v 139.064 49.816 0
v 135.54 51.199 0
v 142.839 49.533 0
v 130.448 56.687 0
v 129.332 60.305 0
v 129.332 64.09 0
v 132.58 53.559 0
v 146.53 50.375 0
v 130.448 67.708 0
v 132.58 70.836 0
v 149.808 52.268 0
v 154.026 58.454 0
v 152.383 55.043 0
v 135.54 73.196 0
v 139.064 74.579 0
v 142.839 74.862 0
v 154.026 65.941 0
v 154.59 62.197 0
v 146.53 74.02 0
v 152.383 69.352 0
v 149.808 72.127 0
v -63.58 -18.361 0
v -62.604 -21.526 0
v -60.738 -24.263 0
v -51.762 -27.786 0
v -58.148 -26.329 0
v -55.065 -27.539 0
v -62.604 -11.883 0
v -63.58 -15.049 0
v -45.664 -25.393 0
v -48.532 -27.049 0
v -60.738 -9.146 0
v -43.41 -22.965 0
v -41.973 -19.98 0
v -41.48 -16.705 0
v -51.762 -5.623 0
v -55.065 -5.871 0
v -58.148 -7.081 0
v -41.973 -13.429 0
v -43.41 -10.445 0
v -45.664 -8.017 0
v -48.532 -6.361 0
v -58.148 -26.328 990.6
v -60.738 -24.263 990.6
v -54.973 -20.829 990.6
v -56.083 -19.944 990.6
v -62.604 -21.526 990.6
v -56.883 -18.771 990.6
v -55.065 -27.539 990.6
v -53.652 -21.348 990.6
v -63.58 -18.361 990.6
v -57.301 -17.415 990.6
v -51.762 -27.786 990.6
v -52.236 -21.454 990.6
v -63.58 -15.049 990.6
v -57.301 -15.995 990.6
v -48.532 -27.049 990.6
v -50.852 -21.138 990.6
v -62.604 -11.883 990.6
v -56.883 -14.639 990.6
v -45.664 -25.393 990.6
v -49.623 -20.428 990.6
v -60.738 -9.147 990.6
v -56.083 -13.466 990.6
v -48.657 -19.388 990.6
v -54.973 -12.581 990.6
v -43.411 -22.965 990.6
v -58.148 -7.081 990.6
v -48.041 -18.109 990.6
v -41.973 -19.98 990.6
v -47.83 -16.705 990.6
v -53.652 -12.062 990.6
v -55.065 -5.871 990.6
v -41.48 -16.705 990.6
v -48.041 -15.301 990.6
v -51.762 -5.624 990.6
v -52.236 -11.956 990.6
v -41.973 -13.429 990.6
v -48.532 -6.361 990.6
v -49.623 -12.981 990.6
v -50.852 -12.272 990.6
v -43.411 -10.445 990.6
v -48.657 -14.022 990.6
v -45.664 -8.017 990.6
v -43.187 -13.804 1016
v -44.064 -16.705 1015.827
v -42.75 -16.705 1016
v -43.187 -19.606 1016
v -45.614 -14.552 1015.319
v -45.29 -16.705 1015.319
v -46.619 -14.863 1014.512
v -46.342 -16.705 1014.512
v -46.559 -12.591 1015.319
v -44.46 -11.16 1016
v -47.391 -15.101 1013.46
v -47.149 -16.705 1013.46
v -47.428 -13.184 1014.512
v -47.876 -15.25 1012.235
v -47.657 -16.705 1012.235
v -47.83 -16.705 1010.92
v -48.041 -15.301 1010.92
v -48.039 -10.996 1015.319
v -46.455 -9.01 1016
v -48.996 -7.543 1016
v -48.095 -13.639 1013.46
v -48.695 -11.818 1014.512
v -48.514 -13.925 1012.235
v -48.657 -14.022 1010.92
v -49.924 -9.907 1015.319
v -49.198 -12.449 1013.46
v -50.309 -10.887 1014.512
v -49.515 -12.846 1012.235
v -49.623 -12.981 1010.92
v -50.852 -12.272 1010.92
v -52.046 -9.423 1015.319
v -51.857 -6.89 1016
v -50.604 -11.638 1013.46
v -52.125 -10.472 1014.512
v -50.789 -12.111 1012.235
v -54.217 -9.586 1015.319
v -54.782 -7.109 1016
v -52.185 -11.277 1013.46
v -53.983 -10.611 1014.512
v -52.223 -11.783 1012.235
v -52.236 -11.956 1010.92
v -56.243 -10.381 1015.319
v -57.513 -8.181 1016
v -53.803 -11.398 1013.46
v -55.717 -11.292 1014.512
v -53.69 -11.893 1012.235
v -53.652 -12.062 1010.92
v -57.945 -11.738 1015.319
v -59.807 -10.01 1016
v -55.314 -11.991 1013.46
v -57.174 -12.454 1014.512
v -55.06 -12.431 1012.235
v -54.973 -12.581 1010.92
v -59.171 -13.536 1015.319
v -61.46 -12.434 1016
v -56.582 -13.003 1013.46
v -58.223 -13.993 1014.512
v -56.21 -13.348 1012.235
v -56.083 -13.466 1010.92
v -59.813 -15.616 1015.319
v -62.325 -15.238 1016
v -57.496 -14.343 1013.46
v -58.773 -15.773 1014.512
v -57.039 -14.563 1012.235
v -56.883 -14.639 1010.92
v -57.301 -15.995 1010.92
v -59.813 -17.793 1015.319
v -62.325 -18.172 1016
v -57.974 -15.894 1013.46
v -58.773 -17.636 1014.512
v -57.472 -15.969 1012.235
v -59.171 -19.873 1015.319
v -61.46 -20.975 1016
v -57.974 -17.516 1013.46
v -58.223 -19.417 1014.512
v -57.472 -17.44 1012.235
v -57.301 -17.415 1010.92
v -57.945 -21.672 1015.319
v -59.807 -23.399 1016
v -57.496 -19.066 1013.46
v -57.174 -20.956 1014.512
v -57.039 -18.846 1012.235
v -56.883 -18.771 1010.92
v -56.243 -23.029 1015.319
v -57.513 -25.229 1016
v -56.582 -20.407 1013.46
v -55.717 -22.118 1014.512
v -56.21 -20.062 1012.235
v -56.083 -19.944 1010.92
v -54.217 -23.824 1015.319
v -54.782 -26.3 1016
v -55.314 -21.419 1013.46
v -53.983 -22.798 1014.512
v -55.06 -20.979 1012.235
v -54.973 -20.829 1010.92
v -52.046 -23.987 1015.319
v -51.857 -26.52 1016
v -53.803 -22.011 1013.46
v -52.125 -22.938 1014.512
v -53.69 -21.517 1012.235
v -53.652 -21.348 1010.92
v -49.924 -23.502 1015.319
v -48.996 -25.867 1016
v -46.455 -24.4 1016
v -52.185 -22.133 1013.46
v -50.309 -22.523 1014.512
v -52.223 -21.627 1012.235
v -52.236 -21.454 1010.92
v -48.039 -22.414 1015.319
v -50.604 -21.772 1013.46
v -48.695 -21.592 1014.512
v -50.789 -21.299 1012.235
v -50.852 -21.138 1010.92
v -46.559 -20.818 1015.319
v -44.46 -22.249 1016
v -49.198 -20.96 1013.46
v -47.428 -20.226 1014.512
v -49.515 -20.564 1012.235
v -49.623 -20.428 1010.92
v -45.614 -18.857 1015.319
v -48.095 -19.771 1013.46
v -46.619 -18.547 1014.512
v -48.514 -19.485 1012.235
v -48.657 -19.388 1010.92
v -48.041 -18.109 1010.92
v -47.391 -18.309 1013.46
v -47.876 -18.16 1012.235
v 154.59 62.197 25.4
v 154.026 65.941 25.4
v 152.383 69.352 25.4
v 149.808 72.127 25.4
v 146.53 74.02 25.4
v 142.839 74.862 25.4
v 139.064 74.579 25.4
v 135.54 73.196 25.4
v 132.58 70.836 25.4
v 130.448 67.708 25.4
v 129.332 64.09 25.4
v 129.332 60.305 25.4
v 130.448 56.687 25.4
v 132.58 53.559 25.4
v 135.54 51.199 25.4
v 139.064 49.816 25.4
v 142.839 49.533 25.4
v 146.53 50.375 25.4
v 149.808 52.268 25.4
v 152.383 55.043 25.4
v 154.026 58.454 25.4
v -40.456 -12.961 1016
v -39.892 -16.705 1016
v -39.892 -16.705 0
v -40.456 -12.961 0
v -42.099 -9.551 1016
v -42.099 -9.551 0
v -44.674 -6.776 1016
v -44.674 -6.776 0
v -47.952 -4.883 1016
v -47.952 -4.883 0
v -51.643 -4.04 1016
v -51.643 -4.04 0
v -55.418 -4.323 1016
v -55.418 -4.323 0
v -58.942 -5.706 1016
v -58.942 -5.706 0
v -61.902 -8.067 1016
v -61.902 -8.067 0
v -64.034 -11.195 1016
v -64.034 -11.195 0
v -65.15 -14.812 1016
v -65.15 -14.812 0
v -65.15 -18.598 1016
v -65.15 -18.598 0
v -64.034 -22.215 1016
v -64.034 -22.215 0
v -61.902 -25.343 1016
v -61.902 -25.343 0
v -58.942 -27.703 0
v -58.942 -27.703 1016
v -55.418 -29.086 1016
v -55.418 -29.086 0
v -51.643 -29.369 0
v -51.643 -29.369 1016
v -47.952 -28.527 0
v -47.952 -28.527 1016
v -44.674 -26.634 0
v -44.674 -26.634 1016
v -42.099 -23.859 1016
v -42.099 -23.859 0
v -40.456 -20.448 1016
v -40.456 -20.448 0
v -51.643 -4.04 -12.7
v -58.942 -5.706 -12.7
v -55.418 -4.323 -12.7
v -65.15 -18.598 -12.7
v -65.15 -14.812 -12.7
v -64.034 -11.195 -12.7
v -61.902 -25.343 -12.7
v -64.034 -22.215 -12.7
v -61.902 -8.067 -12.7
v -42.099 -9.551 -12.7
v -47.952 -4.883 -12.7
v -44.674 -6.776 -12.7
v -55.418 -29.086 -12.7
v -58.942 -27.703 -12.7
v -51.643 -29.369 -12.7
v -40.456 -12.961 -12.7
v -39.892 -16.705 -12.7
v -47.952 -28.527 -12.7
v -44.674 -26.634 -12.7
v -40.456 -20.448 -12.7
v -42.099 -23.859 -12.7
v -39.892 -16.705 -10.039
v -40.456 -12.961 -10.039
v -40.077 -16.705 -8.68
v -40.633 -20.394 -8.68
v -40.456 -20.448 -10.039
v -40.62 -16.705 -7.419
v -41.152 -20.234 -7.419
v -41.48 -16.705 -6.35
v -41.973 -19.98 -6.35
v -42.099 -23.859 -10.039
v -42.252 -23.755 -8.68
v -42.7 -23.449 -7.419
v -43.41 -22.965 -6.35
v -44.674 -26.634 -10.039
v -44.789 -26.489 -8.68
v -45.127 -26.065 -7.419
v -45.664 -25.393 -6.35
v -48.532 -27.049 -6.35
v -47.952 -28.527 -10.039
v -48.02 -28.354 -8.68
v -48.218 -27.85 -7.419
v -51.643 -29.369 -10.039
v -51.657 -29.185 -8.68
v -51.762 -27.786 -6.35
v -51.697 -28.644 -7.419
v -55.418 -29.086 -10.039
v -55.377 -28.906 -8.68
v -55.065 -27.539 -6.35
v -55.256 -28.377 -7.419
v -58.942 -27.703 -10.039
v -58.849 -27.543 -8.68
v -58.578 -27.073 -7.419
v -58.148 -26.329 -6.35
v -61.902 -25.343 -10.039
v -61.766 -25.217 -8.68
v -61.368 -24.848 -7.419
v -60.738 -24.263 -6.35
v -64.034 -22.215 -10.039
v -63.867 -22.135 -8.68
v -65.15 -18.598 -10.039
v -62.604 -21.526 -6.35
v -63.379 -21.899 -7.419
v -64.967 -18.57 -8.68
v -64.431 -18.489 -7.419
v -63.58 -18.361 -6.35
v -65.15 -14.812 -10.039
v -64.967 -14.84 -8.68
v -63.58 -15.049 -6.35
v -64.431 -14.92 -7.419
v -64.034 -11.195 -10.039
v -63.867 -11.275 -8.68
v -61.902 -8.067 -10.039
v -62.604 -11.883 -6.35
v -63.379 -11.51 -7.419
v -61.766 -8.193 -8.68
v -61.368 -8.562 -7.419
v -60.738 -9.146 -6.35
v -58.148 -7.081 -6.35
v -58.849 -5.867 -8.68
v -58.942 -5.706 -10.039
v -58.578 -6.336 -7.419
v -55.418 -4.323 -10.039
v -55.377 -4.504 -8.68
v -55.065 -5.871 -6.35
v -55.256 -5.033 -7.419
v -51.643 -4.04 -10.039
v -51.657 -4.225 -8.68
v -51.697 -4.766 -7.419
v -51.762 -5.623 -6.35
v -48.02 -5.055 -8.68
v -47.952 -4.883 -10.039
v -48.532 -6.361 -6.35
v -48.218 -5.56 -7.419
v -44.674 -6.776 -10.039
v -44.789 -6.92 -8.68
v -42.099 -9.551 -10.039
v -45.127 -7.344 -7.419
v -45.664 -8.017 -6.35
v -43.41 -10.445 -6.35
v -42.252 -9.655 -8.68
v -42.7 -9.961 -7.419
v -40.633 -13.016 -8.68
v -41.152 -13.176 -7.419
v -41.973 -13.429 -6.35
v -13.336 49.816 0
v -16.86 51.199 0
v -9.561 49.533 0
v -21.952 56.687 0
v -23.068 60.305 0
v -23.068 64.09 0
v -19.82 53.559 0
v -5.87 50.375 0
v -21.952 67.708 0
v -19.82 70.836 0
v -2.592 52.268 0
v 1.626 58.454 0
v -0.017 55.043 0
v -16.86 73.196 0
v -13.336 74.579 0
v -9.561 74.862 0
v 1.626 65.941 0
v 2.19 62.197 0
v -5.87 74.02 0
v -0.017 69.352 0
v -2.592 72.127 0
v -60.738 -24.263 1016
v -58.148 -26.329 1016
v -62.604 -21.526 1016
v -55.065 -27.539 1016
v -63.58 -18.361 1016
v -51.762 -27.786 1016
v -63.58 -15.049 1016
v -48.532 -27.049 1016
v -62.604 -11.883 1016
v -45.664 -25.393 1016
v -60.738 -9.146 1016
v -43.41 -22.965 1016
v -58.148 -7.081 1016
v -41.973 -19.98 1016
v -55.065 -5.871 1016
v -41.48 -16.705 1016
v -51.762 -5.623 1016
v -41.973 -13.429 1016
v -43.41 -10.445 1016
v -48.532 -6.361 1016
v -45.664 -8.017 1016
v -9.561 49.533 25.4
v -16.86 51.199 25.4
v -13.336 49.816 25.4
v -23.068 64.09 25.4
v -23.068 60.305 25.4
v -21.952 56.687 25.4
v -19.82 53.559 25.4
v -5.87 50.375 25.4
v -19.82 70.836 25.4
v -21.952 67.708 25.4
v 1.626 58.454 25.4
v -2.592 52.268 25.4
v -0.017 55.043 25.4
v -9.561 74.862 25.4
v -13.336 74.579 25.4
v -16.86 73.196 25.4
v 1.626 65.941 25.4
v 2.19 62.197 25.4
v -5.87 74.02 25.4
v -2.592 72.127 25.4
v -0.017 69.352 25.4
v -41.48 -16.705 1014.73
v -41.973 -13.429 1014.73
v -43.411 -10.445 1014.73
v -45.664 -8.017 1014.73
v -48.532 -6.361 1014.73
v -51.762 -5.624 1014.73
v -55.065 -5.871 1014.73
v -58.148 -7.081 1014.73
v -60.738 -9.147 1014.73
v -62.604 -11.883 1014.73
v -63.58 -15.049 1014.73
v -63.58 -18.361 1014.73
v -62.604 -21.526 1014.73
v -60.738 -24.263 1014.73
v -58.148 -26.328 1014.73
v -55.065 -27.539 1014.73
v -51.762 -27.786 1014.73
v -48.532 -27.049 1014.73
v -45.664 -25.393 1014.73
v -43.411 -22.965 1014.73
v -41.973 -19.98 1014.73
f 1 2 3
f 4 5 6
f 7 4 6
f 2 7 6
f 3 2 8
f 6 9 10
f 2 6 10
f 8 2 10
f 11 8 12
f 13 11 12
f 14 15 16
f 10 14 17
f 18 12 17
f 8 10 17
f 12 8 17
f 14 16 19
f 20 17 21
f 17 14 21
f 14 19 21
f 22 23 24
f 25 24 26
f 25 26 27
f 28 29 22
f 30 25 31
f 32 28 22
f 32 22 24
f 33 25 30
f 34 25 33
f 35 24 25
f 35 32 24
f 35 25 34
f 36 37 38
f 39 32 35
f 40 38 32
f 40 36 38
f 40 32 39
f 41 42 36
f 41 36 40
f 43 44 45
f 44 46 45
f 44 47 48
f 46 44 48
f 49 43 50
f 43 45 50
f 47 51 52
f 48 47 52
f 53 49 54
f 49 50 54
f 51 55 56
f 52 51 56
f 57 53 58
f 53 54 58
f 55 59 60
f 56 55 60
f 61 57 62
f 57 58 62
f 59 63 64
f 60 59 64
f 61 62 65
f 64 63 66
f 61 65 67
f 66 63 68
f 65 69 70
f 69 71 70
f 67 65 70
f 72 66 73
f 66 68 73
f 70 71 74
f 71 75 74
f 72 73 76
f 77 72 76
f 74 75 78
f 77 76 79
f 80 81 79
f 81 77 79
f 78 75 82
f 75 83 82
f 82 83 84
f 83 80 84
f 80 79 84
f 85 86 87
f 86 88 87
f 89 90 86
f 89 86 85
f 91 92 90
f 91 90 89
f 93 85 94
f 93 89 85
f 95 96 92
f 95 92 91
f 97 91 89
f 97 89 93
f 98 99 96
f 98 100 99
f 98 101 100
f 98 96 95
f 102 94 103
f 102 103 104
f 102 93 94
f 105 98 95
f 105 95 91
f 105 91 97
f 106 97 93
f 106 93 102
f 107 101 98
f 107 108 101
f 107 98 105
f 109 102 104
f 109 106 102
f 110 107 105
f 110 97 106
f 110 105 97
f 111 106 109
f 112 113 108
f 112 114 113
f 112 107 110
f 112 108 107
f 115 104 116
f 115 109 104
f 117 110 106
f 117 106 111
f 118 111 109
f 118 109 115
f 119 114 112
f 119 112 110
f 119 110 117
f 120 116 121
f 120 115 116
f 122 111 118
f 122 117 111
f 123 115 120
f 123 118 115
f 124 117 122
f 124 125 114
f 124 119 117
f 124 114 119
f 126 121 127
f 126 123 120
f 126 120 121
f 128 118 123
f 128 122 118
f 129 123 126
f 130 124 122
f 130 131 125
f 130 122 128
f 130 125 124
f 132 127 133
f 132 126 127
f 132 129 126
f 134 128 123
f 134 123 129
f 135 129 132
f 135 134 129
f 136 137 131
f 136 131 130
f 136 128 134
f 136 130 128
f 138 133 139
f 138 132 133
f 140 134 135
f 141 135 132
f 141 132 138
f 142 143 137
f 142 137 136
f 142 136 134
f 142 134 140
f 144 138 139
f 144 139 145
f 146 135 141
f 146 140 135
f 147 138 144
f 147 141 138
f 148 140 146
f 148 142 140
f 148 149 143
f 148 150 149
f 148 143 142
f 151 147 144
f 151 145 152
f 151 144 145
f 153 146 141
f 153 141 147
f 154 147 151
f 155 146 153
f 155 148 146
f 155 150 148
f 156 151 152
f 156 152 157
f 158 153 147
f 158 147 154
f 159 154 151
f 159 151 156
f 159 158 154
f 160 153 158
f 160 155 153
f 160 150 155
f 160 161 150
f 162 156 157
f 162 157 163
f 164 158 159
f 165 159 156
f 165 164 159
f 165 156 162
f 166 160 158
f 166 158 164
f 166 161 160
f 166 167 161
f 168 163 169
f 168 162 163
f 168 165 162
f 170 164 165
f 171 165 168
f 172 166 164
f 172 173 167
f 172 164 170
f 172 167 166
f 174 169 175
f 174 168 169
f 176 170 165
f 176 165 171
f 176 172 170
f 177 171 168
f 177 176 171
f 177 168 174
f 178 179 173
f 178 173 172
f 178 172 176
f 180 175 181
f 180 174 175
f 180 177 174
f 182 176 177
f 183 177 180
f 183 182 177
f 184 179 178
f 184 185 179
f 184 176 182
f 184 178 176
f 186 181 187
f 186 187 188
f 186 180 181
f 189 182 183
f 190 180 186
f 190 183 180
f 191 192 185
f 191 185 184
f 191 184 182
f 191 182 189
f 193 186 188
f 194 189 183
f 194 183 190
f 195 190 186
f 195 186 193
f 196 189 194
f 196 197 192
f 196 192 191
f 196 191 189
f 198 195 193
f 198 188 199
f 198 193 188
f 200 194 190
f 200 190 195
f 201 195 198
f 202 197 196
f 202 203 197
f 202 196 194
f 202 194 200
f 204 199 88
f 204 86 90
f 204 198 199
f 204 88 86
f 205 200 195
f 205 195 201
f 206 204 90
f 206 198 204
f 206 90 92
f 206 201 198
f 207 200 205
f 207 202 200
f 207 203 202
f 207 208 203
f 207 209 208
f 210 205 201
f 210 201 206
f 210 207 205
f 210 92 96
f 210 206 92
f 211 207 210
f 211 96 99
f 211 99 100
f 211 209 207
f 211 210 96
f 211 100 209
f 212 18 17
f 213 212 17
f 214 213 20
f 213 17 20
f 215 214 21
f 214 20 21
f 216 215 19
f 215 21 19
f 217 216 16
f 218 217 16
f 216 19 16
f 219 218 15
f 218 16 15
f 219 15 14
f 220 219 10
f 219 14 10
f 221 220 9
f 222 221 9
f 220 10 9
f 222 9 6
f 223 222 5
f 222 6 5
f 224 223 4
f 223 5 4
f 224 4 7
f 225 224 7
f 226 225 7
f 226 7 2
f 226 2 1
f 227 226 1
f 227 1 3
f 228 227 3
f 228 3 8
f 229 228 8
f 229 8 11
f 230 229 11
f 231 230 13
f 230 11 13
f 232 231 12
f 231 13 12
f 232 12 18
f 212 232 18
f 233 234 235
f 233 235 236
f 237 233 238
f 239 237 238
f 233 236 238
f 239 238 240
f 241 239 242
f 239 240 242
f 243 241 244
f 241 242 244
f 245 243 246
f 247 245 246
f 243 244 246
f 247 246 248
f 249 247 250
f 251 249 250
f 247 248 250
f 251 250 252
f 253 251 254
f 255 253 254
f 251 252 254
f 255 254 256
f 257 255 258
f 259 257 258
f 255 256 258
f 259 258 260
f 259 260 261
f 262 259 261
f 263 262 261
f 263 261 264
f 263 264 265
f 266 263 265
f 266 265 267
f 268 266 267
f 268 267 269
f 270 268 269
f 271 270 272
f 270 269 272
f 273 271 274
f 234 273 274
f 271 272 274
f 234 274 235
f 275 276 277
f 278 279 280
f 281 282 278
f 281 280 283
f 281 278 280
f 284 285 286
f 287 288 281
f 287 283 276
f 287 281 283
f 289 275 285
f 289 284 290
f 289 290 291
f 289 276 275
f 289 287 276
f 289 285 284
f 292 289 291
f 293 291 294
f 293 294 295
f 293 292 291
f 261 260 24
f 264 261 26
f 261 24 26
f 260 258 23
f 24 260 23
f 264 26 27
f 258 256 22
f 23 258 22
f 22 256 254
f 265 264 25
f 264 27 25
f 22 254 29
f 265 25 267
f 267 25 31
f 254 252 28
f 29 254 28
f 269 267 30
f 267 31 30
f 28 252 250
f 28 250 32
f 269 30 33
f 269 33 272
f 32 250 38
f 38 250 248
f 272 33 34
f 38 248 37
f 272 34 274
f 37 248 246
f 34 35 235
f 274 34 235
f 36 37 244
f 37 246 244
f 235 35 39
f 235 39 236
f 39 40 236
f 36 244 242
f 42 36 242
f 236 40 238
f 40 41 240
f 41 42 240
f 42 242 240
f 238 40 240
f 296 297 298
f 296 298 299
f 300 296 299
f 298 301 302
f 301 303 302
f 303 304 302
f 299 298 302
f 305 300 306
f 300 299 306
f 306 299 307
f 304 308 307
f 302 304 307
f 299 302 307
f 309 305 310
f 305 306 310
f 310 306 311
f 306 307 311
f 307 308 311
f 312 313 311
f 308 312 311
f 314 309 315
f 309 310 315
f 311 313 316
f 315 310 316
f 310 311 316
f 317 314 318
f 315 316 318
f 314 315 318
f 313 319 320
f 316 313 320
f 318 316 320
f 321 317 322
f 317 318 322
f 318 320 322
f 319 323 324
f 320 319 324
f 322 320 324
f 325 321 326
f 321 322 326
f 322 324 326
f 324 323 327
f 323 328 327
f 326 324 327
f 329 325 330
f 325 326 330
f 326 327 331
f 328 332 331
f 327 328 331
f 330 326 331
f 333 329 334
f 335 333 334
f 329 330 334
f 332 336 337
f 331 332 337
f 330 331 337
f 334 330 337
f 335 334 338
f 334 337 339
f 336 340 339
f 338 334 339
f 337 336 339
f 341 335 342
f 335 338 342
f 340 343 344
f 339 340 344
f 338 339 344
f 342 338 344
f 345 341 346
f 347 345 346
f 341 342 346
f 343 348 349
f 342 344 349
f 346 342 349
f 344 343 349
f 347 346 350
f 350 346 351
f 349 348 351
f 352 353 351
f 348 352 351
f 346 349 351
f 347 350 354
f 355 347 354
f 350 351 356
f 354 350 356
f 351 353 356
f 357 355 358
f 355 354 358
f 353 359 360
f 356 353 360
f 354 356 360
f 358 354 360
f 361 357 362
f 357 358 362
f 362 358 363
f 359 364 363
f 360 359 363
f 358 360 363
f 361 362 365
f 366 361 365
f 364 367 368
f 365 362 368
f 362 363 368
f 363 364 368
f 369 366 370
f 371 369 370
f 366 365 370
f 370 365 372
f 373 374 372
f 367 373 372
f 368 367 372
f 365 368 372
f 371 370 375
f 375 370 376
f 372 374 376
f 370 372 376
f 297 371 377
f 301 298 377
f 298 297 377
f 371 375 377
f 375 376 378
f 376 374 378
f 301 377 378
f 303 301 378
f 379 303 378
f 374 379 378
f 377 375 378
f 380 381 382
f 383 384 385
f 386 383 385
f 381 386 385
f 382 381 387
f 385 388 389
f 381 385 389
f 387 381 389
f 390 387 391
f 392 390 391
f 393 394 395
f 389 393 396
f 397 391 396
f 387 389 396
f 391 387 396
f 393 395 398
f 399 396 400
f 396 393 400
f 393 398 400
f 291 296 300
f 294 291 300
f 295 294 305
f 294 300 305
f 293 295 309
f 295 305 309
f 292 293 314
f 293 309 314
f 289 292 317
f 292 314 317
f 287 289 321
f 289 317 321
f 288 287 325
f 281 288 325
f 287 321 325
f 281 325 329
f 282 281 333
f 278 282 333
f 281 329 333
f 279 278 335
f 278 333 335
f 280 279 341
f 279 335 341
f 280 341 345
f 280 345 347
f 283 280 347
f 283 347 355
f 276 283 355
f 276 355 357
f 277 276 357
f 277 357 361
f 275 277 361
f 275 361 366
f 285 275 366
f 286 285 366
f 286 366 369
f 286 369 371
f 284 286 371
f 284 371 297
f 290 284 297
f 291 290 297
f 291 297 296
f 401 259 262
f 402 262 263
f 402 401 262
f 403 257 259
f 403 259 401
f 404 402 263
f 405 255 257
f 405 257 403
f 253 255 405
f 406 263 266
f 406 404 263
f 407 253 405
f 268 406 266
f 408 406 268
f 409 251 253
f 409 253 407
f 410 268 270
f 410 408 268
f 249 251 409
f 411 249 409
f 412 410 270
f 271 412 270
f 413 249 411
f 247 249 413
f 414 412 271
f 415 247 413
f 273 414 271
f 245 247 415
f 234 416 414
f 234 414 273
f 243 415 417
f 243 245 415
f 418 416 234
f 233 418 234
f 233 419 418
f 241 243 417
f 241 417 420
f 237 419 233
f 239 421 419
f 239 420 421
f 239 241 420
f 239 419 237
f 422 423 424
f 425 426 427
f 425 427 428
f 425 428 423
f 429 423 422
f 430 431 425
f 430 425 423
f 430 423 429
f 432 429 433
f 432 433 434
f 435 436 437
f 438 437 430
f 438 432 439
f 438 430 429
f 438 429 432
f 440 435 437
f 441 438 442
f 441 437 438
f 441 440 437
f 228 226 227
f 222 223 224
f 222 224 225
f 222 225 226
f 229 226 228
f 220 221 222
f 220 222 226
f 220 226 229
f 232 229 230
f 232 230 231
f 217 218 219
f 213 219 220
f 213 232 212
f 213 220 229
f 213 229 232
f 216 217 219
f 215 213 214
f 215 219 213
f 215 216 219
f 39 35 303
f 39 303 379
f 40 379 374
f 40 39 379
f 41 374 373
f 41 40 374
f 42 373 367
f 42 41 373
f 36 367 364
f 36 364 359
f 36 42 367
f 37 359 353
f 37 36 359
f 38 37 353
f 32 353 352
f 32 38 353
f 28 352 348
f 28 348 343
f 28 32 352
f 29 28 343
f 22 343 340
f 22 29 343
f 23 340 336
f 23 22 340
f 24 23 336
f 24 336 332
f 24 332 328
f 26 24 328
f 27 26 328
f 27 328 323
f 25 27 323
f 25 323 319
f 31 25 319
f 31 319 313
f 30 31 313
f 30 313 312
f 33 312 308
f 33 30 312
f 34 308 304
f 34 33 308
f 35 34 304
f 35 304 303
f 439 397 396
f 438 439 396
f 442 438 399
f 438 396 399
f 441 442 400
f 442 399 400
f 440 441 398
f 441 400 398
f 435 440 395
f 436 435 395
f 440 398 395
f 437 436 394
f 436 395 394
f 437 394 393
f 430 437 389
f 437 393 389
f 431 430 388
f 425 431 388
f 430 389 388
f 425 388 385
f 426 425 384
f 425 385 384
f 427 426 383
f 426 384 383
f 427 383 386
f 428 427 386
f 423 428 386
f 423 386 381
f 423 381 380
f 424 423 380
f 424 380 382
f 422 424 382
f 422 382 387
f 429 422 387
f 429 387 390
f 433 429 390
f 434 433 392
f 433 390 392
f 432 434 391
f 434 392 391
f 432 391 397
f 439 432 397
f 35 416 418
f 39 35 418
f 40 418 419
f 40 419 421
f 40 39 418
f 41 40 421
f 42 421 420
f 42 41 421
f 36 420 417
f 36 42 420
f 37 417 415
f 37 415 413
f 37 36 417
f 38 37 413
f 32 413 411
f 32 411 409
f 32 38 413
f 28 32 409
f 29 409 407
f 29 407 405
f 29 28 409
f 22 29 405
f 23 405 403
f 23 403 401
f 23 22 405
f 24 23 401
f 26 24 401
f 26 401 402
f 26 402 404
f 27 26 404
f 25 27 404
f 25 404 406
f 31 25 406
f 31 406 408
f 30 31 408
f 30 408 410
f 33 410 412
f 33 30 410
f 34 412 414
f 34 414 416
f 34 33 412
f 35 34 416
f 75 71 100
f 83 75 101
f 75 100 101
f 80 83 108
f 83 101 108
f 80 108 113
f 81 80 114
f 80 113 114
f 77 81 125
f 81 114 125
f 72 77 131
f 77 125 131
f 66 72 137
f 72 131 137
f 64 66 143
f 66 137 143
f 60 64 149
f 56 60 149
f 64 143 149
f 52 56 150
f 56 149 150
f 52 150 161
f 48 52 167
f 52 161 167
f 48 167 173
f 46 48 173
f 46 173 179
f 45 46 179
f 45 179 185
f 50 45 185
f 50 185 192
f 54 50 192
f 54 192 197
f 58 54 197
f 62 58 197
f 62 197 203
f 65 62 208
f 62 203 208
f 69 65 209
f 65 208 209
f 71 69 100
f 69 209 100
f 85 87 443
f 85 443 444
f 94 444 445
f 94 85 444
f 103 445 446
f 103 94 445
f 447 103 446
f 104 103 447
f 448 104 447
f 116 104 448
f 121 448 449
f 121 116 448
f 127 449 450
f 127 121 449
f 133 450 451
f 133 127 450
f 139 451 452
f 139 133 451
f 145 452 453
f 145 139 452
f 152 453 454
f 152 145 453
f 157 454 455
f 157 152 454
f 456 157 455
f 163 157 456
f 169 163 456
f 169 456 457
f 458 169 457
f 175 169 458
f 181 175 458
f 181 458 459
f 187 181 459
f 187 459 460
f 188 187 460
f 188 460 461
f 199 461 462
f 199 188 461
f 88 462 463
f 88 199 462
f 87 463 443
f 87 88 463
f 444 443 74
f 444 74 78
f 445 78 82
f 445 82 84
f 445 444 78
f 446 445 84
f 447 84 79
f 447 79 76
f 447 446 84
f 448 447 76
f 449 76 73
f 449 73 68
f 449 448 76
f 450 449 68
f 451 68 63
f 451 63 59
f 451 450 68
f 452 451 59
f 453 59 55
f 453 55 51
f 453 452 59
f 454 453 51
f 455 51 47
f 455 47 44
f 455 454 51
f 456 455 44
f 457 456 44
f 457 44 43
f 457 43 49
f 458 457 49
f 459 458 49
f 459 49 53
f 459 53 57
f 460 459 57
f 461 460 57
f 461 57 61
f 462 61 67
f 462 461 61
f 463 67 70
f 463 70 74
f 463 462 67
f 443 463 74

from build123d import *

# Parameters (mm, degrees)
F0_R      = 12.7
F0_R_2    = 11.1125
F1_DEPTH  = 1016
F2_DEPTH  = 6.35
F3_R      = 12.7
F4_DEPTH  = 6.35
F6_R      = 11.1123873654
F6_R_2    = 4.7623887658
F7_DEPTH  = 25.4
F8_DEPTH  = 25.4
F9_SIZE   = 1.27
F10_R     = 5.07999
F12_R     = 12.7
F13_DEPTH = 25.4


# Not quite as in the source:
# - a fillet or chamfer that OpenCascade refuses, or shapes differently, is made with other operations: its cross-section is extruded or revolved along the edge and cut away or added
# - a fillet or chamfer is up to 0.001 mm smaller than in the source, because OpenCascade refuses the exact size


with BuildPart() as f1:
    # F0 (on Top) → F1 (new body)
    with BuildSketch(Plane.XY):
        with Locations((-52.5920726359, -16.7048629373)):
            Circle(F0_R)
        with Locations((-52.5920726359, -16.7048629373)):
            Circle(F0_R_2, mode=Mode.SUBTRACT)
    extrude(amount=F1_DEPTH)

    # F0 (on Top) → F2 (join)
    with BuildSketch(Plane.XY):
        with Locations((-52.5920726359, -16.7048629373)):
            Circle(F0_R_2)
    extrude(amount=-F2_DEPTH)

    # F3 (on face) → F4 (join)
    with BuildSketch(Plane(origin=(0, 0, -6.35), x_dir=(1, 0, 0), z_dir=(0, 0, -1))):
        with Locations((-52.5920726359, 16.7048629373)):
            Circle(F3_R)
    extrude(amount=F4_DEPTH)

    # F5: fillet of radius 5.08 on 1 edges, made by hand

    # F5_s1 → F5_t2 (revolve, cut)
    with BuildSketch(Plane.XZ.offset(16.7048629373)):
        with BuildLine():
            ThreePointArc((-39.8920726359, -10.0390166373), (-40.3057946759, -8.0309703231), (-41.4795726359, -6.35))
            Line((-41.4795726359, -6.35), (-41.4097226359, -6.2762196673))
            ThreePointArc((-41.4097226359, -6.2762196673), (-40.6858226359, -6.2484), (-39.8920726359, -6.2484))
            Line((-39.8920726359, -6.2484), (-39.7904726359, -6.35))
            Line((-39.7904726359, -6.35), (-39.7904726359, -10.0390166373))
            Line((-39.7904726359, -10.0390166373), (-39.8920726359, -10.0390166373))
        make_face()
    revolve(axis=Axis((-52.5920726359, -16.7048629373, -6.35), (0, 0, -1)), mode=Mode.SUBTRACT)


with BuildPart() as f7:
    # F6 (on face) → F7 (new body)
    with BuildSketch(Plane.XY.offset(1016)):
        with Locations((-52.5920726359, -16.7048629373)):
            Circle(F6_R)
        with Locations((-52.5920726359, -16.7048629373)):
            Circle(F6_R_2, mode=Mode.SUBTRACT)
    extrude(amount=-F7_DEPTH)

    # F6 (on face) → F8 (join)
    with BuildSketch(Plane.XY.offset(1016)):
        with Locations((-52.5920726359, -16.7048629373)):
            Circle(F6_R)
        with Locations((-52.5920726359, -16.7048629373)):
            Circle(F6_R_2, mode=Mode.SUBTRACT)
    extrude(amount=-F8_DEPTH)

    # F9
    f9_edges = [f7.edges().sort_by_distance(p)[0] for p in [
        (-63.70446, -16.704863, 1016),
    ]]
    chamfer(f9_edges, length=F9_SIZE)

    # F10 (radius 5.08 in the source; OpenCascade refuses exactly that, so slightly less here)
    f10_edges = [f7.edges().sort_by_distance(p)[0] for p in [
        (-57.354461, -16.704863, 1016),
    ]]
    fillet(f10_edges, radius=F10_R)


with BuildPart() as f13:
    # F12 (on Top) → F13 (new body)
    with BuildSketch(Plane.XY):
        with Locations((-10.5100030951, 62.1974789812)):
            Circle(F12_R)
    extrude(amount=F13_DEPTH)


with BuildPart() as f13b:
    # F12 (on Top) → F13, piece 2 (new body)
    with BuildSketch(Plane.XY):
        with Locations((141.8899969049, 62.1974789812)):
            Circle(F12_R)
    extrude(amount=F13_DEPTH)


with BuildPart() as f1_1:
    # F14: moved
    add(f1.part)


solid = Compound([f7.part, f13.part, f13b.part, f1_1.part])
